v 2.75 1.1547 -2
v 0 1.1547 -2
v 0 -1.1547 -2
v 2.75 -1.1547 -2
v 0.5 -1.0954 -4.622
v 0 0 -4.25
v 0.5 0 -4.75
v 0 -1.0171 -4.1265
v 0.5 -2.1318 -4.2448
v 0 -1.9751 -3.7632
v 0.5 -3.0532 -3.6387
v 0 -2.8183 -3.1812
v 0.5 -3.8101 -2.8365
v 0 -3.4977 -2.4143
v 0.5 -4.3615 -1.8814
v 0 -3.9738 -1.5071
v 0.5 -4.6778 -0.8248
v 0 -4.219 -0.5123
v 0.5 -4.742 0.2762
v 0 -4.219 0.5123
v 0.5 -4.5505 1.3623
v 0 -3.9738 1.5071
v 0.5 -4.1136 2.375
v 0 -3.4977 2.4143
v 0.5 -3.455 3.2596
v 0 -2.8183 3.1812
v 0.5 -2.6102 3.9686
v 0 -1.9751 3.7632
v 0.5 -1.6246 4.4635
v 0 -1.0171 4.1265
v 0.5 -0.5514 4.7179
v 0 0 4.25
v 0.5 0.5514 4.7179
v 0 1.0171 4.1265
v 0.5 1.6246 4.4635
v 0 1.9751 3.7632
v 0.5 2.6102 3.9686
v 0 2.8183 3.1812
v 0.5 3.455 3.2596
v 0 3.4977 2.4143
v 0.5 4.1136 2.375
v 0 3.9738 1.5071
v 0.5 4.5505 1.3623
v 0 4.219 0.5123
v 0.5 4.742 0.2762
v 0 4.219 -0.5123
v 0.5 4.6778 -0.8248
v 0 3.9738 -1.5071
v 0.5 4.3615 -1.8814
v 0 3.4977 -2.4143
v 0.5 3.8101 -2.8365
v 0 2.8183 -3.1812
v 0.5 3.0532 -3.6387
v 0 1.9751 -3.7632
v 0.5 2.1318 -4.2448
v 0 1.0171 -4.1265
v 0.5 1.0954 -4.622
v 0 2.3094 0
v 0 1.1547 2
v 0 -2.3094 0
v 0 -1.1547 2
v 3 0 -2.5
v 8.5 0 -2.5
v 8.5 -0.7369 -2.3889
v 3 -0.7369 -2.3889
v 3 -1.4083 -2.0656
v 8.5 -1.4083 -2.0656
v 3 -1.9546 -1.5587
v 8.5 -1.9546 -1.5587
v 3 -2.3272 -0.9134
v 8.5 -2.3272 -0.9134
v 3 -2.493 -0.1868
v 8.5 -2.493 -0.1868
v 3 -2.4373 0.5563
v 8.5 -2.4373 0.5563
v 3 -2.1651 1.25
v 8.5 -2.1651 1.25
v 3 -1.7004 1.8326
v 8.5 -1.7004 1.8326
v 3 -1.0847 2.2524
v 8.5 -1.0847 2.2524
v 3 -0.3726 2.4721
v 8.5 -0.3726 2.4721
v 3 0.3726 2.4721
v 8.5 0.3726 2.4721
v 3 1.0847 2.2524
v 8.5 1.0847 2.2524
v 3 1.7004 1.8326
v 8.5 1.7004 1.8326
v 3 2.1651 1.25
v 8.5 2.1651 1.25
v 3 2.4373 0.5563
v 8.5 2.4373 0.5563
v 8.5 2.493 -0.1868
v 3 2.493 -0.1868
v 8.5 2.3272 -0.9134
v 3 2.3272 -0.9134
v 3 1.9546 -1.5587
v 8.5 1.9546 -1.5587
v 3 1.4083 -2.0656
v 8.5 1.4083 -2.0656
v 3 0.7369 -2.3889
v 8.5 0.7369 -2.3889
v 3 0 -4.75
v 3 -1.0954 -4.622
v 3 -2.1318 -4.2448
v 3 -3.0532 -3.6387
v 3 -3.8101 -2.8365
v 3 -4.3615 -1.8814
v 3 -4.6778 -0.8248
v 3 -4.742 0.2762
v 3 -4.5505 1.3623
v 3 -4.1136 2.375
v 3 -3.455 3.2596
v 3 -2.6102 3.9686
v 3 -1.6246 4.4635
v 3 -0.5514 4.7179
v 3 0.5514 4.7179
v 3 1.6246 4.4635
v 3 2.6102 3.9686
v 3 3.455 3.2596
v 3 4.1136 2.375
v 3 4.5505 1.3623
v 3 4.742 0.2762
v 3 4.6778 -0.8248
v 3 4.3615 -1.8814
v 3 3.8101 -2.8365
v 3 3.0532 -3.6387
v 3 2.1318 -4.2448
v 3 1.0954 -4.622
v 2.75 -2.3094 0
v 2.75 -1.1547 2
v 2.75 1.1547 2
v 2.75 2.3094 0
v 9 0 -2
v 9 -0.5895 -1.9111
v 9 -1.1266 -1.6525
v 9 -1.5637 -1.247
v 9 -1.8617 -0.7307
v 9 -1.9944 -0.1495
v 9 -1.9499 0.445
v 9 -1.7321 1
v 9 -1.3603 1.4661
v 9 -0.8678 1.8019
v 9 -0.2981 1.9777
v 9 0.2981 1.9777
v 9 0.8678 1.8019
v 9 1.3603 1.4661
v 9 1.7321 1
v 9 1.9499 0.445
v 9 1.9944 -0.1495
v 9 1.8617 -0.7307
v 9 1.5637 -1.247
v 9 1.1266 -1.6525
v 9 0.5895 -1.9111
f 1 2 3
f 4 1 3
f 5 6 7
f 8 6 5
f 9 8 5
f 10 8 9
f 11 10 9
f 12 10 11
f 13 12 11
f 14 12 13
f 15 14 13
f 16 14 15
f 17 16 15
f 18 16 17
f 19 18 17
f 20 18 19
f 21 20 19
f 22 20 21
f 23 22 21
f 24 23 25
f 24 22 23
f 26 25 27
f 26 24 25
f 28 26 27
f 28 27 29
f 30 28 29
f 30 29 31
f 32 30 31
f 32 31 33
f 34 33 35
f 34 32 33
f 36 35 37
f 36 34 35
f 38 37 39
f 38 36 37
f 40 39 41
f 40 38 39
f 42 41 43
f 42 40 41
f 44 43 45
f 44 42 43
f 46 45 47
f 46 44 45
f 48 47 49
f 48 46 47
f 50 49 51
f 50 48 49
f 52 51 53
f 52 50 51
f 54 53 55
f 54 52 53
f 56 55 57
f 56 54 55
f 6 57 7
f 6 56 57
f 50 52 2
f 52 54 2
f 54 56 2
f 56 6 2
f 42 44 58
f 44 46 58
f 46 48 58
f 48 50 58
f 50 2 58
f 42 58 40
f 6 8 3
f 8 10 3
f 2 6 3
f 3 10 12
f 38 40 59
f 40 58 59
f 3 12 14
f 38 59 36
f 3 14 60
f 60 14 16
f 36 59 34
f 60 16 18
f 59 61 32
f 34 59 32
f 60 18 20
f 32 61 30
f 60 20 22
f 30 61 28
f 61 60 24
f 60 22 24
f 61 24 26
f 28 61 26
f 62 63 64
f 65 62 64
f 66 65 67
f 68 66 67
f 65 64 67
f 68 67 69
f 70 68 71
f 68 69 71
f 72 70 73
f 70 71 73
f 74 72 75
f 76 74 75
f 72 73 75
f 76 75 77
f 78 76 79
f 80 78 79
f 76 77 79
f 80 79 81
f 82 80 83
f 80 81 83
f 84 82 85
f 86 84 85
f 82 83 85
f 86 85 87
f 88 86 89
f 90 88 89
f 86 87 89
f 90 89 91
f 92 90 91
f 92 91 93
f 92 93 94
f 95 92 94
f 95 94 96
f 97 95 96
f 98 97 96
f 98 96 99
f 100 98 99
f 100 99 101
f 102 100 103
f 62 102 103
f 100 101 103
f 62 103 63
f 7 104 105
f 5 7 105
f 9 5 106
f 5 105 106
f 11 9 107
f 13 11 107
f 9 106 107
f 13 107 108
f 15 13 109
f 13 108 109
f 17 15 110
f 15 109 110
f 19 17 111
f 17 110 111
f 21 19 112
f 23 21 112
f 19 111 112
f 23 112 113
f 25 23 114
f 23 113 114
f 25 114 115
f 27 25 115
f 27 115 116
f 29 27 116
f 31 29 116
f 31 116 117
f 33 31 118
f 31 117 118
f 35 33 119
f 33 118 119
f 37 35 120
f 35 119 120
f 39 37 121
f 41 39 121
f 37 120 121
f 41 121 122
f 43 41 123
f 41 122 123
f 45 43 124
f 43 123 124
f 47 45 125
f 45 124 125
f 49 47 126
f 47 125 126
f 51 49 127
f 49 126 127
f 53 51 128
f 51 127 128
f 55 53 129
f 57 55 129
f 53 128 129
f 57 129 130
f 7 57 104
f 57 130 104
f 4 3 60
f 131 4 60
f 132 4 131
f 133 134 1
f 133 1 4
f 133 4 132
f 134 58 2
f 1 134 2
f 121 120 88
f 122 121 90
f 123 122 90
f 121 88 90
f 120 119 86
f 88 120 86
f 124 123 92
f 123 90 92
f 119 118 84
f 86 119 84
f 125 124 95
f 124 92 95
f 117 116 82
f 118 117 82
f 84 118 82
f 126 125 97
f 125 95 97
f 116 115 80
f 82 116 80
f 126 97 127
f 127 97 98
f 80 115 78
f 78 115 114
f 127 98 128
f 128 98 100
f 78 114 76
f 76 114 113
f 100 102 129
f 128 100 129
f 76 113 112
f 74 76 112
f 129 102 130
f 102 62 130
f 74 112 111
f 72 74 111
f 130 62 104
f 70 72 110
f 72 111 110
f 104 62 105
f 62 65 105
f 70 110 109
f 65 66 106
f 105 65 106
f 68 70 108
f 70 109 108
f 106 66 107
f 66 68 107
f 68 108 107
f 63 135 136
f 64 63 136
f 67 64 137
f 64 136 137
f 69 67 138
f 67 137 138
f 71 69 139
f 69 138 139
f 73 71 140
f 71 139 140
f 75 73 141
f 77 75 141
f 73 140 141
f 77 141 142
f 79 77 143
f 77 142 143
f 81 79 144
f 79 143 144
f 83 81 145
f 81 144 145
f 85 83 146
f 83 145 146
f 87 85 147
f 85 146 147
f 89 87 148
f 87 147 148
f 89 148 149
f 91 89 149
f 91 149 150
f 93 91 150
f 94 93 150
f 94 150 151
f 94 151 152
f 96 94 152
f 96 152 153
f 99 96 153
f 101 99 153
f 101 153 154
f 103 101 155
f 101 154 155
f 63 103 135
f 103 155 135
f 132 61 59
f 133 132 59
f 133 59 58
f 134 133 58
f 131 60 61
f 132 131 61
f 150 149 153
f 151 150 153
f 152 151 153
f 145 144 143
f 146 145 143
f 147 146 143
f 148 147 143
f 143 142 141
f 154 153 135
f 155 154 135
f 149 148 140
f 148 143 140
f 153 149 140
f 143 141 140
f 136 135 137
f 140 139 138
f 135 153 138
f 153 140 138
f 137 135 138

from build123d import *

# Parameters (mm, degrees)
CUT_EXTRUDE1_DEPTH = 2.75
CHAMFER1_SIZE      = 0.5
CHAMFER2_SIZE      = 0.5


with BuildPart() as part:
    # Sketch1 → Revolve1 (revolve)
    with BuildSketch(Plane.XY, mode=Mode.PRIVATE) as revolve1_sk:
        Polygon((0, 0), (0, 4.75), (3, 4.75), (3, 2.5), (9, 2.5), (9, 0), align=None)
    revolve(revolve1_sk.sketch.rotate(Axis((9, 0, 0), (-1, 0, 0)), 90), axis=Axis((9, 0, 0), (-1, 0, 0)))

    # Sketch2 → Cut-Extrude1 (cut)
    with BuildSketch(Plane.ZY):
        Polygon((0, 2.309401077), (-2, 1.154700538), (-2, -1.154700538), (0, -2.309401077), (2, -1.154700538), (2, 1.154700538), align=None)
    extrude(amount=-CUT_EXTRUDE1_DEPTH, mode=Mode.SUBTRACT)

    # Chamfer1
    chamfer1_edges = [part.edges().sort_by_distance(p)[0] for p in [
        (9, 0, 2.5),
    ]]
    chamfer(chamfer1_edges, length=CHAMFER1_SIZE)

    # Chamfer2
    chamfer2_edges = [part.edges().sort_by_distance(p)[0] for p in [
        (0, 0, 4.75),
    ]]
    chamfer(chamfer2_edges, length=CHAMFER2_SIZE)


solid = part.part
